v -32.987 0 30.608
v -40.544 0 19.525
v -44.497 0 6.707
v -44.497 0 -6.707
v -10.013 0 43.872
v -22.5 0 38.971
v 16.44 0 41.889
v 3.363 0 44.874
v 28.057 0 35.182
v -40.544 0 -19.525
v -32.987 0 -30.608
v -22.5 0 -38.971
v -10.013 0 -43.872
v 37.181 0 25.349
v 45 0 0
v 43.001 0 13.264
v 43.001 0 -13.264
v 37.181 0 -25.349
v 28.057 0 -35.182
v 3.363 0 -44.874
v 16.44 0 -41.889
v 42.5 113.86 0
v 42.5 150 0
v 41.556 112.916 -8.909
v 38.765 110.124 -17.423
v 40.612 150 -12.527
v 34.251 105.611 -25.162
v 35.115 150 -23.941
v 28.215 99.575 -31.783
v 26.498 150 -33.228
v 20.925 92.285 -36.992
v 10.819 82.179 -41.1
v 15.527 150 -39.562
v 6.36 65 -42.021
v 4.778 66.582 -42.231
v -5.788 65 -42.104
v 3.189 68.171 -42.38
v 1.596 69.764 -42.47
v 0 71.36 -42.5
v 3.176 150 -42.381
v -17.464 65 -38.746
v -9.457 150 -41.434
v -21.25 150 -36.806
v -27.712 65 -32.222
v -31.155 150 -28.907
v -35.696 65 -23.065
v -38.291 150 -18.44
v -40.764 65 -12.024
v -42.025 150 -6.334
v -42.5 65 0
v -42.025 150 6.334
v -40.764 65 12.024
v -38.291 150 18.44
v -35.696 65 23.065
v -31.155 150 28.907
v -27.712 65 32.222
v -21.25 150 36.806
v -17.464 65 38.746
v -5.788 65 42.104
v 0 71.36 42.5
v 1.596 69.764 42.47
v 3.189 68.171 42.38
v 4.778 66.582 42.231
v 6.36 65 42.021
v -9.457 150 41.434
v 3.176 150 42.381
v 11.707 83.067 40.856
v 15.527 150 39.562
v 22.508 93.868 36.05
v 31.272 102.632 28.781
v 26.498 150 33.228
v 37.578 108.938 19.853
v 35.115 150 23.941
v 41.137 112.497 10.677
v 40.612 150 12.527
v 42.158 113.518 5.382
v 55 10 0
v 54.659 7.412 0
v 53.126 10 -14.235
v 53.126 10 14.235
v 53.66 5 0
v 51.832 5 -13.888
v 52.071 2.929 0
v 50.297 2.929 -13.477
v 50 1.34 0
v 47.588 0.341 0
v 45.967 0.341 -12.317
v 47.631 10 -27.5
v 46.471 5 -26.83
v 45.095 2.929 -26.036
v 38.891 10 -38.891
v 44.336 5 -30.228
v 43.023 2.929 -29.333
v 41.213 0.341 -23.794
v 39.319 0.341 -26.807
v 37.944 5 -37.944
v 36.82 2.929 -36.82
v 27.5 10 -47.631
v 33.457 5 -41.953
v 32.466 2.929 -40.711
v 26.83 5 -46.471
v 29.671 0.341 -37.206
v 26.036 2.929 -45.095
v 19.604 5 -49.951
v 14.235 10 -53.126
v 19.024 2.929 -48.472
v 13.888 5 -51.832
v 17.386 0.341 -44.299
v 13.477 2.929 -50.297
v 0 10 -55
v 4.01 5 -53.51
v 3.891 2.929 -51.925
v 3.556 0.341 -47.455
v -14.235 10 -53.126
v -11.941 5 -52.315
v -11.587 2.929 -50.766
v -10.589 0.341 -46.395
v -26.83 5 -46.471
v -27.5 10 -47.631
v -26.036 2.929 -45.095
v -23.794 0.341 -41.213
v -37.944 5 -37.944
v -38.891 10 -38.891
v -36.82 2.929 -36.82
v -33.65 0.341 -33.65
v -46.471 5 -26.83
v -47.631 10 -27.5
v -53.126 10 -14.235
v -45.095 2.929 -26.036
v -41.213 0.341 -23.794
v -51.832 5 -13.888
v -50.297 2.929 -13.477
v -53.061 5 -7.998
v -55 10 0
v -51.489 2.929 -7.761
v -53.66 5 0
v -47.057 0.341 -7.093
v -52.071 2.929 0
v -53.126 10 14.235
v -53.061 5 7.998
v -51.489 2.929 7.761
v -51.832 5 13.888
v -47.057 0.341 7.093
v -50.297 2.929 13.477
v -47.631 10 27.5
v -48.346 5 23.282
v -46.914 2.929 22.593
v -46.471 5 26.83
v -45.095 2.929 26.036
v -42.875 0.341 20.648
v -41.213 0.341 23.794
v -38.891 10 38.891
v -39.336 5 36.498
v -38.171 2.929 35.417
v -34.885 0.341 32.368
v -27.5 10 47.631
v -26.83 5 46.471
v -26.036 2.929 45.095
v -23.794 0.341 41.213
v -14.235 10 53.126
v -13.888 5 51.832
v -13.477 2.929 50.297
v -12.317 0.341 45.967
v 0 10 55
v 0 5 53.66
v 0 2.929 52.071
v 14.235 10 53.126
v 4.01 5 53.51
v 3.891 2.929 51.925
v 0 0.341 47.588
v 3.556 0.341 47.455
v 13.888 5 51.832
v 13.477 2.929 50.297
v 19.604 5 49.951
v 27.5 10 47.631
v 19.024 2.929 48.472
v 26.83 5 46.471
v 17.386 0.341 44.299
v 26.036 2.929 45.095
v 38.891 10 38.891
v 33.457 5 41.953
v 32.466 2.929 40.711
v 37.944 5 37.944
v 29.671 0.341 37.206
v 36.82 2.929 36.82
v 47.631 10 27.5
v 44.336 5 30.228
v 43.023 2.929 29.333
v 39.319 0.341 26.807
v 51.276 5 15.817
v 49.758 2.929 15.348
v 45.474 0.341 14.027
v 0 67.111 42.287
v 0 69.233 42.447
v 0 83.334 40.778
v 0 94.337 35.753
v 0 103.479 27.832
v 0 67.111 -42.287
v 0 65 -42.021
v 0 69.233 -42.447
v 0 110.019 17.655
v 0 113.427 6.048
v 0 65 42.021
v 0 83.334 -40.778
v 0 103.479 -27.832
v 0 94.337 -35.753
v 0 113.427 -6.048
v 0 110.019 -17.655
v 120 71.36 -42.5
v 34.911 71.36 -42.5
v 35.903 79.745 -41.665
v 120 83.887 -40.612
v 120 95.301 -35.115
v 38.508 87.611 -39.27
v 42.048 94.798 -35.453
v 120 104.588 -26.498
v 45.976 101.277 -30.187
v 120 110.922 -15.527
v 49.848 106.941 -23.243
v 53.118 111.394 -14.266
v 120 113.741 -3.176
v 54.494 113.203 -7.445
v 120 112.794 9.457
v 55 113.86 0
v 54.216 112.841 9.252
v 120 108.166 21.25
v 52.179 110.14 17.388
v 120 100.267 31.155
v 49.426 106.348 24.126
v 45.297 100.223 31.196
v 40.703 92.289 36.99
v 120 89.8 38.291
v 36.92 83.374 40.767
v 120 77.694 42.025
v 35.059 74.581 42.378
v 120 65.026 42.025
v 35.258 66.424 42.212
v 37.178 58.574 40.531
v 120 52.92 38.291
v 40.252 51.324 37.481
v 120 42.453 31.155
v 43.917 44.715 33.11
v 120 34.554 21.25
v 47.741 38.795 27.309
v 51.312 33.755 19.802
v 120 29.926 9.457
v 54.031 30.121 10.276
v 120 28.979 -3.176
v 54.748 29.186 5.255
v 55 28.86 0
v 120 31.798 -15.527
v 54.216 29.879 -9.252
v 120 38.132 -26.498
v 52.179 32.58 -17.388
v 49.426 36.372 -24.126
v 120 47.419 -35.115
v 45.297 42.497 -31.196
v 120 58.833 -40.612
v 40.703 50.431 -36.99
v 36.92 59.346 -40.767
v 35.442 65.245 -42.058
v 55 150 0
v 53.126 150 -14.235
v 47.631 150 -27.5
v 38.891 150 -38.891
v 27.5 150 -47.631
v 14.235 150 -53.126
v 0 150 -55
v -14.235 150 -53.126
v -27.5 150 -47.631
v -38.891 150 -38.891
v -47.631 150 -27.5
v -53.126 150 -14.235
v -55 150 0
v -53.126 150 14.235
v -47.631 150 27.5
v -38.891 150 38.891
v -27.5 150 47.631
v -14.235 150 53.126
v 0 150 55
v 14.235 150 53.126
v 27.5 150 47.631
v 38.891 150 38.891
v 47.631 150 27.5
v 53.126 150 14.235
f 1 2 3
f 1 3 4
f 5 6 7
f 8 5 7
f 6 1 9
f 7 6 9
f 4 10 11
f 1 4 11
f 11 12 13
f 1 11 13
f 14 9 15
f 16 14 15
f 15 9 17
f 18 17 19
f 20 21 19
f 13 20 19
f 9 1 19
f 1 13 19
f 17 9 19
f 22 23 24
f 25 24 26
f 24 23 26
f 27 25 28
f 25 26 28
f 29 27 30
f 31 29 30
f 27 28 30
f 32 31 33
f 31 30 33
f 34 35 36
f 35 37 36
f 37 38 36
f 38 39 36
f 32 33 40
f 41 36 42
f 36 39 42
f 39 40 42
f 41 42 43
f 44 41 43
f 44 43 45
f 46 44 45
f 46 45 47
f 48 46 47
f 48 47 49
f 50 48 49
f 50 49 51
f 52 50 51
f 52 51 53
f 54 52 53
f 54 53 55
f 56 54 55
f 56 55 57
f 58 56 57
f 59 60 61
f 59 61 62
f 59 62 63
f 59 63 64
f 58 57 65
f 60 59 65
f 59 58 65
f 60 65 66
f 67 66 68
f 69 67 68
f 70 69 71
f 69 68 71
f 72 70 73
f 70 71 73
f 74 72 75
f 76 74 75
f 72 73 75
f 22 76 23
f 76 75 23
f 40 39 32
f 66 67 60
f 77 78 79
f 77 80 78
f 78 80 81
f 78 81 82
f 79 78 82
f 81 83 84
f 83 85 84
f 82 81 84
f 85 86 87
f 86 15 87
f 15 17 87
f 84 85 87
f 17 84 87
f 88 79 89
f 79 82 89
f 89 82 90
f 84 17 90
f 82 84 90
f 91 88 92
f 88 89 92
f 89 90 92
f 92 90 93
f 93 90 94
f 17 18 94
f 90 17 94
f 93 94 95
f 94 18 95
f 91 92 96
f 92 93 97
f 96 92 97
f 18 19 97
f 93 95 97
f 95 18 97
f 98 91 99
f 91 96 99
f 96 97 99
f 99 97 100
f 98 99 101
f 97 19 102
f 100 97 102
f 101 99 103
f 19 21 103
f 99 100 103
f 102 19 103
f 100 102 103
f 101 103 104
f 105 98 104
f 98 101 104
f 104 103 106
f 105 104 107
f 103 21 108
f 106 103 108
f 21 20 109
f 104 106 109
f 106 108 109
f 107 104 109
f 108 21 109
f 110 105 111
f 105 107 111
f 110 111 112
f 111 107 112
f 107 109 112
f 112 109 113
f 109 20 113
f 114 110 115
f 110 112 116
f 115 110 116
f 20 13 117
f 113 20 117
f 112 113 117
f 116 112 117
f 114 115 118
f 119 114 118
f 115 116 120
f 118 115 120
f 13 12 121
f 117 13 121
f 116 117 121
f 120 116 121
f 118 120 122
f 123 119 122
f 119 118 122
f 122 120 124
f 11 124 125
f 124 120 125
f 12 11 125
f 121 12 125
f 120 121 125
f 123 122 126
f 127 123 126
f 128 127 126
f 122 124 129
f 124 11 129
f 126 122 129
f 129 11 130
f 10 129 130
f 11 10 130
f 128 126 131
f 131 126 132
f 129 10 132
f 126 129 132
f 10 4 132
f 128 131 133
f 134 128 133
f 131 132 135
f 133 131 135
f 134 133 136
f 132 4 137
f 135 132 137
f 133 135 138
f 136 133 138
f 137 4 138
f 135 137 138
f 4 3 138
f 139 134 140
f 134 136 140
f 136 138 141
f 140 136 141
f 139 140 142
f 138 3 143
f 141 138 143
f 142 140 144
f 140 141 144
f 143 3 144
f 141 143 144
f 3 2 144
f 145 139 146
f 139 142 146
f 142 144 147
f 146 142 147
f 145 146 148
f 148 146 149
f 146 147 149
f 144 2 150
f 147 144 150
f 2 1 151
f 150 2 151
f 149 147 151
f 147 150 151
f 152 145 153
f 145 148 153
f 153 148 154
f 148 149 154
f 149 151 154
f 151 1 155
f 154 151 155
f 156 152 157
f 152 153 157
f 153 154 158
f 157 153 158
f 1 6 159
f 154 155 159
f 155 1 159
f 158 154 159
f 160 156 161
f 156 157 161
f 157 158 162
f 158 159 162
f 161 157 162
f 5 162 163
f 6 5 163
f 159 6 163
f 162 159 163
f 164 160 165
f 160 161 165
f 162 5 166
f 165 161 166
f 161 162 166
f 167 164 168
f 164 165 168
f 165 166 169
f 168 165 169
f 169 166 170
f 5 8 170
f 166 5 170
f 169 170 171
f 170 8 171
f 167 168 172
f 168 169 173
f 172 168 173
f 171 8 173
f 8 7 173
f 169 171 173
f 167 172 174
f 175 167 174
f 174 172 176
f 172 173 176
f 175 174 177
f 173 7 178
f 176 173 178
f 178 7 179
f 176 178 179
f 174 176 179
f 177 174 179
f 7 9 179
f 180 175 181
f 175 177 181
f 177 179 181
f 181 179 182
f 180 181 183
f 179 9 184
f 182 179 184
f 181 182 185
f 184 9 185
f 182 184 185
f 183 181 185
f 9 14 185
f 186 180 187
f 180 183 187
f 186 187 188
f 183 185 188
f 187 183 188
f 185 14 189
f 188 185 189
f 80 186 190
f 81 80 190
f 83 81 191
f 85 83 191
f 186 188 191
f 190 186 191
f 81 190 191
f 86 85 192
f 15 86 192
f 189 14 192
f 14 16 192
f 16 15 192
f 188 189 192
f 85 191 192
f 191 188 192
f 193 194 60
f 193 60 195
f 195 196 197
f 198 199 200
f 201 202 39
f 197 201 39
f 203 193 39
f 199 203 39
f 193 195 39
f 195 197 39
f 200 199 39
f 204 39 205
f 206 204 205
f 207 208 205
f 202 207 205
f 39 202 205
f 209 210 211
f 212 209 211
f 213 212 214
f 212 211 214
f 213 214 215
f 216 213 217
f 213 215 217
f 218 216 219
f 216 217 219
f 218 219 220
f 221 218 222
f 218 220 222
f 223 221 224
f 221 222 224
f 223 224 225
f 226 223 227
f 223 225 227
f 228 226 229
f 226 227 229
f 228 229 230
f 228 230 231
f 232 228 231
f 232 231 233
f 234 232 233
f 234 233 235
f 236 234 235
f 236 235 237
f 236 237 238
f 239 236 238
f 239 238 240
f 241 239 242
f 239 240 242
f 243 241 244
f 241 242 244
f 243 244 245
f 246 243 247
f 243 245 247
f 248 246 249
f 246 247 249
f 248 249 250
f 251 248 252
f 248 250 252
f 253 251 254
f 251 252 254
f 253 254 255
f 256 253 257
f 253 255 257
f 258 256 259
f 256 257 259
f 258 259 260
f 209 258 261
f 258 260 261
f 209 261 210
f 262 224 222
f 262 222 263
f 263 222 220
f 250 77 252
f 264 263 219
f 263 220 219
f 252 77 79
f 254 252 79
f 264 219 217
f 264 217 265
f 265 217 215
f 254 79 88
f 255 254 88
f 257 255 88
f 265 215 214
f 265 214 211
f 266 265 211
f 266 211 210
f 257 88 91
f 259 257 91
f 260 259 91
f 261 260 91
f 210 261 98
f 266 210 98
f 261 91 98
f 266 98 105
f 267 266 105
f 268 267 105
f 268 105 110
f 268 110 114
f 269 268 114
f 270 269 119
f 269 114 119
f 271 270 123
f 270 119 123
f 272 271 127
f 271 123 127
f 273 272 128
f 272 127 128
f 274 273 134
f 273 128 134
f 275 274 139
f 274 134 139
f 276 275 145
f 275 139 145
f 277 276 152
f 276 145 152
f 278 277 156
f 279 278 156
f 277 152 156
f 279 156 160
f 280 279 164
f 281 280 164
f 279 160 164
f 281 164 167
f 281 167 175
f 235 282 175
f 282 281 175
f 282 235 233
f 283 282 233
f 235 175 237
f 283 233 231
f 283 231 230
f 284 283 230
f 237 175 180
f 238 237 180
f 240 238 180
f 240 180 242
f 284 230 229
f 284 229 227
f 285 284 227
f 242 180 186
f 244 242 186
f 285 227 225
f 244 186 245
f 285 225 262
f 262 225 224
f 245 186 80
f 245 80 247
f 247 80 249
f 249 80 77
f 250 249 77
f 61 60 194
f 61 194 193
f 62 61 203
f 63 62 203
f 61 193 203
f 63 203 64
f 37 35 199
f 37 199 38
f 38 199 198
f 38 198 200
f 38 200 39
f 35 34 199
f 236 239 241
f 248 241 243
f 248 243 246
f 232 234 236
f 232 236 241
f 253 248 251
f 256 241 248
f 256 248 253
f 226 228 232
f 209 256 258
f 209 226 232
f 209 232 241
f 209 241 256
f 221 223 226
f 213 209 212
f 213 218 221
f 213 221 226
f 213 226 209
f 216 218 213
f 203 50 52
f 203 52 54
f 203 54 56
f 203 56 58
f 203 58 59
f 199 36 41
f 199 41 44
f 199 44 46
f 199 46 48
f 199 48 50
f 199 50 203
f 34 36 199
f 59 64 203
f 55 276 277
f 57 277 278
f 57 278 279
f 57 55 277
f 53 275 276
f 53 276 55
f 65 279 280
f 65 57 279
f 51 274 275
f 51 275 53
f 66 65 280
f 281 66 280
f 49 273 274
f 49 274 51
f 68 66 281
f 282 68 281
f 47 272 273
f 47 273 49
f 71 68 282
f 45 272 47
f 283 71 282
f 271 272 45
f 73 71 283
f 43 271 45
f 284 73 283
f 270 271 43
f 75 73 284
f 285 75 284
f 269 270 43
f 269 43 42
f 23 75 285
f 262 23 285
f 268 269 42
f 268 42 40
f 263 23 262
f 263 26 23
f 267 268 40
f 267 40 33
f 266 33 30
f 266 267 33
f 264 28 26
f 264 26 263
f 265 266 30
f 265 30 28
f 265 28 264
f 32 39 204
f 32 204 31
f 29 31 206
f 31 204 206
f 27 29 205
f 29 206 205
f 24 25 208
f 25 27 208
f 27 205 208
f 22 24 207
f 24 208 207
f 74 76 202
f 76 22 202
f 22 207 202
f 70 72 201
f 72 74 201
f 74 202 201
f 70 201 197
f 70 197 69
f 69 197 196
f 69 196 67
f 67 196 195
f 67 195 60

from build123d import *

# Parameters (mm, degrees)
SKETCH1_R           = 55
BOSS_EXTRUDE1_DEPTH = 150
FILLET1_R           = 10
SKETCH3_R           = 42.5
CUT_EXTRUDE2_DEPTH  = 85
SKETCH13_R          = 42.5
BOSS_EXTRUDE3_DEPTH = 120


with BuildPart() as part:
    # Sketch1 → Boss-Extrude1 (new body)
    with BuildSketch(Plane(origin=(0, 0, 0), x_dir=(1, 0, 0), z_dir=(0, 1, 0))):
        Circle(SKETCH1_R)
    extrude(amount=BOSS_EXTRUDE1_DEPTH)

    # Fillet1
    fillet1_edges = [part.edges().sort_by_distance(p)[0] for p in [
        (-55, 0, 0),
    ]]
    fillet(fillet1_edges, radius=FILLET1_R)

    # Sketch3 → Cut-Extrude2 (cut)
    with BuildSketch(Plane(origin=(0, 150, 0), x_dir=(1, 0, 0), z_dir=(0, 1, 0))):
        Circle(SKETCH3_R)
    extrude(amount=-CUT_EXTRUDE2_DEPTH, mode=Mode.SUBTRACT)

    # Sketch13 → Boss-Extrude3 (add)
    with BuildSketch(Plane(origin=(0, 0, 0), x_dir=(0, 0, -1), z_dir=(1, 0, 0))):
        with Locations((0, 71.359942757)):
            Circle(SKETCH13_R)
    extrude(amount=BOSS_EXTRUDE3_DEPTH)


solid = part.part
